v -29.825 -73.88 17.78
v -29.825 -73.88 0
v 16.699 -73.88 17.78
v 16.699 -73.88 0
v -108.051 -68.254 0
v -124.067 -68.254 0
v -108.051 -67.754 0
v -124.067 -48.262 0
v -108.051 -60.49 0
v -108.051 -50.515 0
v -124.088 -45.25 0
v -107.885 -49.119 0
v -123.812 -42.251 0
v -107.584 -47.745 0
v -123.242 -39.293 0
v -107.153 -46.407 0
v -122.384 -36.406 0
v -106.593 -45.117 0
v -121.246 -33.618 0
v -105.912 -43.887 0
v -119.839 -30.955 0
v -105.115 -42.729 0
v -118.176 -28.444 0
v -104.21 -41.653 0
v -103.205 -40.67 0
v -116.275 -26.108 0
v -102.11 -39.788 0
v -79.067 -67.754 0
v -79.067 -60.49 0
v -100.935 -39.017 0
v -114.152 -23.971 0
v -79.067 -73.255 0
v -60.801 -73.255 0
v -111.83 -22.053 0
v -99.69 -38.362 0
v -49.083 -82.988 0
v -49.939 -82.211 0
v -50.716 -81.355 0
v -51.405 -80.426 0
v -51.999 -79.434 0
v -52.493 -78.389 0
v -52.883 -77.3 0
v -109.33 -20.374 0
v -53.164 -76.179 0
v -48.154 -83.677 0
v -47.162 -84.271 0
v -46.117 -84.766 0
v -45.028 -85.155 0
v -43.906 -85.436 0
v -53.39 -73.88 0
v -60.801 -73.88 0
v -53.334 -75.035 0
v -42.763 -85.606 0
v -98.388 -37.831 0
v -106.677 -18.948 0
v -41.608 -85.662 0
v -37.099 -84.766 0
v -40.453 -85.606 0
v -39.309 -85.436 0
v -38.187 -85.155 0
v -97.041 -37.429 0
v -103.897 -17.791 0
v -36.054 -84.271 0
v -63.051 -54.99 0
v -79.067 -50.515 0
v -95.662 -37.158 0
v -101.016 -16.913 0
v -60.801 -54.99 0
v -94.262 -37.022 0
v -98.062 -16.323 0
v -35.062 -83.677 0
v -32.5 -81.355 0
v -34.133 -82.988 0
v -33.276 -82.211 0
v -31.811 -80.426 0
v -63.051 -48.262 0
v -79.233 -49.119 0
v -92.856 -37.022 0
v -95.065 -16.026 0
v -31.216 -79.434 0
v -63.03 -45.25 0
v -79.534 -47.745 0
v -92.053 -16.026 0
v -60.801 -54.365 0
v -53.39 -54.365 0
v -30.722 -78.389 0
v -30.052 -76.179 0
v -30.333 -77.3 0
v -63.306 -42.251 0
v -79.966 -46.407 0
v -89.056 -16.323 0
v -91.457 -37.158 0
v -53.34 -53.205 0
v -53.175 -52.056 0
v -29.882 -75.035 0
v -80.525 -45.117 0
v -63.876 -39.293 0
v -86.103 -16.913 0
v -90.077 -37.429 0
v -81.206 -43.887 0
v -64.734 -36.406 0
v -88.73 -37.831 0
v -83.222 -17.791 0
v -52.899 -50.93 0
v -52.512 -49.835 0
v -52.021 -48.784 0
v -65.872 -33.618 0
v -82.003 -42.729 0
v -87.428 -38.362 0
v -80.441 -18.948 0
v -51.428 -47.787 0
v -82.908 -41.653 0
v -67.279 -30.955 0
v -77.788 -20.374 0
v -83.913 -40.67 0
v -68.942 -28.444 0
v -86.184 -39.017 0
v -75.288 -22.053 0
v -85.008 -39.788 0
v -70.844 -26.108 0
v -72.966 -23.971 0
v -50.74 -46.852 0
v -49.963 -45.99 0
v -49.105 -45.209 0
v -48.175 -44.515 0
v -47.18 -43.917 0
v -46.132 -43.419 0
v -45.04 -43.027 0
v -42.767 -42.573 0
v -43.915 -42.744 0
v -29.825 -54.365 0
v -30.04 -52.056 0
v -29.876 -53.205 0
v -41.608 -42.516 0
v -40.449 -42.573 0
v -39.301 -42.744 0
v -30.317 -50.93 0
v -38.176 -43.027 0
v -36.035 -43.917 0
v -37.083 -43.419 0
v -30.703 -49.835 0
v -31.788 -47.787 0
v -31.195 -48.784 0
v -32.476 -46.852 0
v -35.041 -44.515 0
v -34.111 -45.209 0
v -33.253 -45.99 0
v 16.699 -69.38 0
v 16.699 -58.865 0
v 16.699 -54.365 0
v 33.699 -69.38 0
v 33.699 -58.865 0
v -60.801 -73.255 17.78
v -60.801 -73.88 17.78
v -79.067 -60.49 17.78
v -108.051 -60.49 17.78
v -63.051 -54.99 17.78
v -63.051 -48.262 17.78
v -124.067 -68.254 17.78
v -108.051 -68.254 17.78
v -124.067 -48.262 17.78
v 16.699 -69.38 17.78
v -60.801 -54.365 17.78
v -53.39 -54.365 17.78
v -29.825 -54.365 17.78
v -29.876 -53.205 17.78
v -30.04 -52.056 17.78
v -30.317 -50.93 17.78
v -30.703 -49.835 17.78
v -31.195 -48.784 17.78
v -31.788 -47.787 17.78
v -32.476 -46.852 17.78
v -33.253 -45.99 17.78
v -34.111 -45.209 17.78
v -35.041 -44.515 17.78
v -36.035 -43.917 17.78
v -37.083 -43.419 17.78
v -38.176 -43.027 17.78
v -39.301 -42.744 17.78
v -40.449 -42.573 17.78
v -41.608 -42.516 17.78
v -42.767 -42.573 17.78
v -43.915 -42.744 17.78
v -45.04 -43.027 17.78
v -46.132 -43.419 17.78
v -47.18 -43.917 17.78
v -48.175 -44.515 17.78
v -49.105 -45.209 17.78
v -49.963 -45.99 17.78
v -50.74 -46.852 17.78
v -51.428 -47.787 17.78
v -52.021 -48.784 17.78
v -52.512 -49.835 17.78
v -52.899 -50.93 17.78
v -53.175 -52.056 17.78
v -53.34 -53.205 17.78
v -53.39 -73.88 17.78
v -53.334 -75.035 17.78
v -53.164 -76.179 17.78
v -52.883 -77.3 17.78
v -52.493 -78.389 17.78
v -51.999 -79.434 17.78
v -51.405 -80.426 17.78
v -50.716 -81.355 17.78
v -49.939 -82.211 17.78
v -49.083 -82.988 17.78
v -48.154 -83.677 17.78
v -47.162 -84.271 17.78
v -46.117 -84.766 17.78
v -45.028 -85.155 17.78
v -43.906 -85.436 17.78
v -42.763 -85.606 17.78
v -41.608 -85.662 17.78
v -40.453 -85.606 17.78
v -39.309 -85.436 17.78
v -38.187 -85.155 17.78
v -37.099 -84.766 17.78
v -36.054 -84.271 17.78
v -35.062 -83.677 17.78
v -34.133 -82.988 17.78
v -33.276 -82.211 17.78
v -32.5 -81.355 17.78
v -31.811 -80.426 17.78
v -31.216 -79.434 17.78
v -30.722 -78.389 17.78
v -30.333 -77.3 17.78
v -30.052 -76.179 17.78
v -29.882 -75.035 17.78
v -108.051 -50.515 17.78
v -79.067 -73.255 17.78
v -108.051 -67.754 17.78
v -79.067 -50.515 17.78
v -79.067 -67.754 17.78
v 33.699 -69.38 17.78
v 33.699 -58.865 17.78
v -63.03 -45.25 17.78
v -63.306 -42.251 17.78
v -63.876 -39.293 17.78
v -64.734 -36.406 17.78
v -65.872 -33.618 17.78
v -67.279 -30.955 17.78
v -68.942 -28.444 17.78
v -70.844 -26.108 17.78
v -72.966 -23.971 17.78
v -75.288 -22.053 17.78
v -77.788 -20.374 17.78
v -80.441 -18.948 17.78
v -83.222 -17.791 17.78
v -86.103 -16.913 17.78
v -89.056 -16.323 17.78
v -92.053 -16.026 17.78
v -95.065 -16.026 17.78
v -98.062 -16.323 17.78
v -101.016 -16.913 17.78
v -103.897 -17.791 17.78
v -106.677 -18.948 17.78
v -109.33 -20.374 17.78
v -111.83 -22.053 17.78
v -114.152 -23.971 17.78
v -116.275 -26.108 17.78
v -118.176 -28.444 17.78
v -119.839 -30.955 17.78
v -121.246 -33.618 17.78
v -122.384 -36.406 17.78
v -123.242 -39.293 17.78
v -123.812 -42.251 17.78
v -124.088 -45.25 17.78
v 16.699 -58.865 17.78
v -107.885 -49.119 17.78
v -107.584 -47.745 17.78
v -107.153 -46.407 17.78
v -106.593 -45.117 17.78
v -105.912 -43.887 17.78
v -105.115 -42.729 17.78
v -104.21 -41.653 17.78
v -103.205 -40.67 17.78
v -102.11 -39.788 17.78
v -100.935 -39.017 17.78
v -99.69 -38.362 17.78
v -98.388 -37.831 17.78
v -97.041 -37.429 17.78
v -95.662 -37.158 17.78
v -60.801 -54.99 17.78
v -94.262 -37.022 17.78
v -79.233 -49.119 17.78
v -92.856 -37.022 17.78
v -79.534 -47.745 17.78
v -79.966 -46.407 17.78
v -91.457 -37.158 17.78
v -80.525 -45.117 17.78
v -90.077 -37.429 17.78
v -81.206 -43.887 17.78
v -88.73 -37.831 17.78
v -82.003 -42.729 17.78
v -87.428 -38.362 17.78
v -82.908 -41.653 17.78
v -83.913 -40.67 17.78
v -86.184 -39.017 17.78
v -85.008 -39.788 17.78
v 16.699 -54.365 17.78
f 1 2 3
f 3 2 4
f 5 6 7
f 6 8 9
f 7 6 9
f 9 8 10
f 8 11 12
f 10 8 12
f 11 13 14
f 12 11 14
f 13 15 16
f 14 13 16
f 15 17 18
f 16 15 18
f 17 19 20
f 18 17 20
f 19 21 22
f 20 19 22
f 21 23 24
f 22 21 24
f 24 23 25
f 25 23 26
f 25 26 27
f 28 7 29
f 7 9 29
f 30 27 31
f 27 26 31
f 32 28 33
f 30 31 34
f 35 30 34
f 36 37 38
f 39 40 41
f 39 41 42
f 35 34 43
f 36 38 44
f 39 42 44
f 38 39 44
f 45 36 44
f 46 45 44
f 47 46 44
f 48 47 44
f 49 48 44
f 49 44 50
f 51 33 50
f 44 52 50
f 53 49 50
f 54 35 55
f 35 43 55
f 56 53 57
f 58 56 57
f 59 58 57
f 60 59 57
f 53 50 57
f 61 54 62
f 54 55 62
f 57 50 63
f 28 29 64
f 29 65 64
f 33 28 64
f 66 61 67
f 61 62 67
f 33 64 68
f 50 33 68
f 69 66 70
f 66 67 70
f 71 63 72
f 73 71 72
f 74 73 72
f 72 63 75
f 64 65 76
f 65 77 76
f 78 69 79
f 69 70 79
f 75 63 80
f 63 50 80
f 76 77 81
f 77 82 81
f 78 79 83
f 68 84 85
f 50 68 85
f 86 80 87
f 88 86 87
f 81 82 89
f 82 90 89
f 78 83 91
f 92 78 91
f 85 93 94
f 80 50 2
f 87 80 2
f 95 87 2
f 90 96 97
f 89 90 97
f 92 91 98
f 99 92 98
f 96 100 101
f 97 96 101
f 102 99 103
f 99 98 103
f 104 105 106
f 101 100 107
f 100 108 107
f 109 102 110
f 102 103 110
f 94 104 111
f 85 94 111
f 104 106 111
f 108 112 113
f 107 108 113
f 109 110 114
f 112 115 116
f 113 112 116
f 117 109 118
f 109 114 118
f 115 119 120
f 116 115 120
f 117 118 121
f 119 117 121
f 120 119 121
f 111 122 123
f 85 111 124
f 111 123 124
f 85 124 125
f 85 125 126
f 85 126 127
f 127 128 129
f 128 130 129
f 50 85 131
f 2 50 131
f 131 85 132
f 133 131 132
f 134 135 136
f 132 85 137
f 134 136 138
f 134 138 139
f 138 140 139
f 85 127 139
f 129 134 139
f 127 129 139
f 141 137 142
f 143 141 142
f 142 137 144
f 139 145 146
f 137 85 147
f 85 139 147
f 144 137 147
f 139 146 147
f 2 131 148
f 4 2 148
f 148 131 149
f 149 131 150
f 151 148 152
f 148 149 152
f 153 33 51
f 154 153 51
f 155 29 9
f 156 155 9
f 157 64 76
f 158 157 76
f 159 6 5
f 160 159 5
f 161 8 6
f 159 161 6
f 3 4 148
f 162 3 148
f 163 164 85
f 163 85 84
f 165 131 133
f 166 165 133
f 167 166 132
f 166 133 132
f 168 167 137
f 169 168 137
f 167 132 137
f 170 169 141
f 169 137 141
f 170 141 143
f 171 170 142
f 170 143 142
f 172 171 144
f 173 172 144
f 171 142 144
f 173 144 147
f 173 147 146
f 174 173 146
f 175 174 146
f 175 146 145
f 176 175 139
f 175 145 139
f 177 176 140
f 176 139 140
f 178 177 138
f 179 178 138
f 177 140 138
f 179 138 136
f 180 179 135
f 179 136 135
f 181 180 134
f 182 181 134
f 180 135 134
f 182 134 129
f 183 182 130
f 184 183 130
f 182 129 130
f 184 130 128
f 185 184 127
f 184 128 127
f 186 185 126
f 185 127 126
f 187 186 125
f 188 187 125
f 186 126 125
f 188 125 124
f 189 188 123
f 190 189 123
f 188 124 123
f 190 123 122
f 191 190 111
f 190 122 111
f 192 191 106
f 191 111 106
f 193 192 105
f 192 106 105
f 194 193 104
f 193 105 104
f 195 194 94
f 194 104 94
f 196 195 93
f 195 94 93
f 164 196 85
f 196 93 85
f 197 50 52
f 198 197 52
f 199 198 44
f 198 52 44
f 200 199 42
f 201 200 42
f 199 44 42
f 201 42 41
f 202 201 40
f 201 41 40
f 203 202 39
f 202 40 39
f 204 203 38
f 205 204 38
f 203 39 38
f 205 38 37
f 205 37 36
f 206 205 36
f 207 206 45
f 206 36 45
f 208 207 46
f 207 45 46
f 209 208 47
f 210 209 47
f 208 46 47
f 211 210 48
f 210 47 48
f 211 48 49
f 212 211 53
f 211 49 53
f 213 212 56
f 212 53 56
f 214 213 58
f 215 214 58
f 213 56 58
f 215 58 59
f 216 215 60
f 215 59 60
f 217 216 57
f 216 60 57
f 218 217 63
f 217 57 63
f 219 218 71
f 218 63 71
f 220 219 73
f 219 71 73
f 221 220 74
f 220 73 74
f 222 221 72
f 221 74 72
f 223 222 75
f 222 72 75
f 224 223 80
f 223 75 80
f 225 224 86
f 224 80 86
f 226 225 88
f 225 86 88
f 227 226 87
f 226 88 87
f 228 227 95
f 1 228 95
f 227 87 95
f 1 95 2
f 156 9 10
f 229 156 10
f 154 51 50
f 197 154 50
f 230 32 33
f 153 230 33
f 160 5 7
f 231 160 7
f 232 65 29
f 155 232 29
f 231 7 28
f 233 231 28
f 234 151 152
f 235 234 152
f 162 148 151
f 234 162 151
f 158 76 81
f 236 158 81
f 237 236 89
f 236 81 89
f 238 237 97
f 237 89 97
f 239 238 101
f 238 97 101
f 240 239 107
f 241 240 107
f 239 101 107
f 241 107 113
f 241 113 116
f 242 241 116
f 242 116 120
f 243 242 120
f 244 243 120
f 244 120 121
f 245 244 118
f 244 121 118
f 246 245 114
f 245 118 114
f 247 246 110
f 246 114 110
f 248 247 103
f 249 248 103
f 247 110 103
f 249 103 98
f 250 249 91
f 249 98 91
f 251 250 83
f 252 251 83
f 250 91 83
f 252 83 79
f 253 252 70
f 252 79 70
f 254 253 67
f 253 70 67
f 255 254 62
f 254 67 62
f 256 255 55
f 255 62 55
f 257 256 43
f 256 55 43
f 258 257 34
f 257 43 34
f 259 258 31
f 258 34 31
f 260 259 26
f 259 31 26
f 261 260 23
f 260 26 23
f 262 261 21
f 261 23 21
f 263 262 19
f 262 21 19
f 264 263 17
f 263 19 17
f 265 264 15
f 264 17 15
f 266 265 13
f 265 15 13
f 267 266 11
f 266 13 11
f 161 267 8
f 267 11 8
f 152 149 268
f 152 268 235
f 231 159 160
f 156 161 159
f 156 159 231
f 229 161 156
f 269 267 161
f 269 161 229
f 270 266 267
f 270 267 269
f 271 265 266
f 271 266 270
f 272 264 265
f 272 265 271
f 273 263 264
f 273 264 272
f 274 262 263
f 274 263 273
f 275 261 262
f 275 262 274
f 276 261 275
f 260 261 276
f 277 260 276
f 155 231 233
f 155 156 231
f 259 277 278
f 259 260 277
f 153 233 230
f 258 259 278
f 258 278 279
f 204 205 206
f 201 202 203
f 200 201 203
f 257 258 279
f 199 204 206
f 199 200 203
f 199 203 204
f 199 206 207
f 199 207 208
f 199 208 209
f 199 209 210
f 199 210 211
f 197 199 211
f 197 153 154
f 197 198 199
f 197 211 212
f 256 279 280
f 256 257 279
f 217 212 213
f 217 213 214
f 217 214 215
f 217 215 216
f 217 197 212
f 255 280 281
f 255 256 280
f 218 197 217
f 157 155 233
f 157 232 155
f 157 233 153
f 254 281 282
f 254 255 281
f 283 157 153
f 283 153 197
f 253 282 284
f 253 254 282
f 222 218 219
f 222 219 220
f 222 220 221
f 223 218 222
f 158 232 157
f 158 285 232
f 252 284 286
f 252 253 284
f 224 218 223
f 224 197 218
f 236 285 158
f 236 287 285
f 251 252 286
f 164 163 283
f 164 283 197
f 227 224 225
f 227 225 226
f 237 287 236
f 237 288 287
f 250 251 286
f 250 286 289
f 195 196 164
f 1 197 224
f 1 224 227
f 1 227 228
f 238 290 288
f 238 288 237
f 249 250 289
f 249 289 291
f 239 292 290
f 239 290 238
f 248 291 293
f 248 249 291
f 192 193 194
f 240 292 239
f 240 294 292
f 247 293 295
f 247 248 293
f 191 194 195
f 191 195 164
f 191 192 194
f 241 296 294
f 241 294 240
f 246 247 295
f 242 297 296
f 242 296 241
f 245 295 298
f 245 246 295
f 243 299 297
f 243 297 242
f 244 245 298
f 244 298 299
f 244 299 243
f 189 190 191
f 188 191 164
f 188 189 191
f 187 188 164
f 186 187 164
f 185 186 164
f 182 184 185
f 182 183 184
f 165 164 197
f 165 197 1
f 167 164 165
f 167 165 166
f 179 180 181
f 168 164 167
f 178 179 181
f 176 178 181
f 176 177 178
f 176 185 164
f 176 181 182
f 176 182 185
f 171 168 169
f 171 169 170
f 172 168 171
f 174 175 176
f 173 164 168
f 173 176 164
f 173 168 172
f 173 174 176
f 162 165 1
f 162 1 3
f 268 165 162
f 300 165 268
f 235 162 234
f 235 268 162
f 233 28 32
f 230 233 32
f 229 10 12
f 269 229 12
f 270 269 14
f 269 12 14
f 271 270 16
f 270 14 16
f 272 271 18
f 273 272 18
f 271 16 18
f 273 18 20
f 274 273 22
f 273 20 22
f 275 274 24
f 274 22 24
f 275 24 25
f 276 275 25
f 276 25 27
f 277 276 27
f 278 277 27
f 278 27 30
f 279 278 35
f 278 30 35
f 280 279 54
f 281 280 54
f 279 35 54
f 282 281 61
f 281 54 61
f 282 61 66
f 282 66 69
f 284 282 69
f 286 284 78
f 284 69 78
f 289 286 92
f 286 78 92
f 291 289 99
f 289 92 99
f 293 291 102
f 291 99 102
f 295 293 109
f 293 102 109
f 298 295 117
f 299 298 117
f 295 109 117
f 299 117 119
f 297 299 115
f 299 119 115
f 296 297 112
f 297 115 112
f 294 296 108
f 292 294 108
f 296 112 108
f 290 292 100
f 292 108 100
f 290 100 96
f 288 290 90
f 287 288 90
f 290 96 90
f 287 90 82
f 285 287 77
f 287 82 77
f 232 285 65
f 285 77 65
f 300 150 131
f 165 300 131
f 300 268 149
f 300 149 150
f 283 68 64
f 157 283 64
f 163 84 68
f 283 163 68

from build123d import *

# Parameters (mm, degrees)
F0_W     = 17
F0_H     = 10.514781
F1_DEPTH = 17.78


with BuildPart() as f1:
    # F0 (on Top) → F1 (new body)
    with BuildSketch(Plane.XY):
        with BuildLine():
            Line((-63.051145, -54.98954), (-63.051145, -48.261526))
            ThreePointArc((-63.051145, -48.261526), (-93.559145, -15.989189), (-124.067145, -48.261526))
            Line((-124.067145, -48.261526), (-124.067145, -54.989189))
            Line((-124.067145, -54.989189), (-124.067145, -56.005189))
            Line((-124.067145, -56.005189), (-124.067145, -68.254414))
            Line((-124.067145, -68.254414), (-108.051145, -68.254414))
            Line((-108.051145, -68.254414), (-108.051145, -67.754308))
            Line((-108.051145, -67.754308), (-108.051145, -60.490071))
            Line((-108.051145, -60.490071), (-108.051145, -56.005189))
            Line((-108.051145, -56.005189), (-108.051145, -54.989189))
            Line((-108.051145, -54.989189), (-108.051145, -50.514857))
            ThreePointArc((-108.051145, -50.514857), (-93.559145, -37.005189), (-79.067145, -50.514857))
            Line((-79.067145, -50.514857), (-79.067145, -54.98954))
            Line((-79.067145, -54.98954), (-63.051145, -54.98954))
        make_face()
        Polygon((-79.067145, -61.005189), (-79.067145, -60.490071), (-108.051145, -60.490071), (-108.051145, -67.754308), (-79.067145, -67.754308), align=None)
        Polygon((-60.801145, -54.98954), (-63.051145, -54.98954), (-79.067145, -54.98954), (-79.067145, -60.490071), (-79.067145, -61.005189), (-79.067145, -67.754308), (-79.067145, -73.254839), (-60.801145, -73.254839), align=None)
        Polygon((-60.801145, -54.364518), (-60.801145, -54.98954), (-60.801145, -73.254839), (-60.801145, -73.879861), (-53.390384, -73.879861), (-29.825188, -73.879861), (-23.928846, -73.879861), (16.698855, -73.879861), (16.698855, -69.37958), (16.698855, -58.864799), (16.698855, -54.364518), (-29.825188, -54.364518), (-53.390384, -54.364518), align=None)
        with Locations((25.198855, -64.122189)):
            Rectangle(F0_W, F0_H)
        with BuildLine():
            ThreePointArc((-29.825188, -54.364518), (-41.607786, -42.515753), (-53.390384, -54.364518))
            Line((-53.390384, -54.364518), (-29.825188, -54.364518))
        make_face()
        with BuildLine():
            Line((-29.825188, -73.879861), (-53.390384, -73.879861))
            ThreePointArc((-53.390384, -73.879861), (-41.607786, -85.662459), (-29.825188, -73.879861))
        make_face()
    extrude(amount=F1_DEPTH)


solid = f1.part
